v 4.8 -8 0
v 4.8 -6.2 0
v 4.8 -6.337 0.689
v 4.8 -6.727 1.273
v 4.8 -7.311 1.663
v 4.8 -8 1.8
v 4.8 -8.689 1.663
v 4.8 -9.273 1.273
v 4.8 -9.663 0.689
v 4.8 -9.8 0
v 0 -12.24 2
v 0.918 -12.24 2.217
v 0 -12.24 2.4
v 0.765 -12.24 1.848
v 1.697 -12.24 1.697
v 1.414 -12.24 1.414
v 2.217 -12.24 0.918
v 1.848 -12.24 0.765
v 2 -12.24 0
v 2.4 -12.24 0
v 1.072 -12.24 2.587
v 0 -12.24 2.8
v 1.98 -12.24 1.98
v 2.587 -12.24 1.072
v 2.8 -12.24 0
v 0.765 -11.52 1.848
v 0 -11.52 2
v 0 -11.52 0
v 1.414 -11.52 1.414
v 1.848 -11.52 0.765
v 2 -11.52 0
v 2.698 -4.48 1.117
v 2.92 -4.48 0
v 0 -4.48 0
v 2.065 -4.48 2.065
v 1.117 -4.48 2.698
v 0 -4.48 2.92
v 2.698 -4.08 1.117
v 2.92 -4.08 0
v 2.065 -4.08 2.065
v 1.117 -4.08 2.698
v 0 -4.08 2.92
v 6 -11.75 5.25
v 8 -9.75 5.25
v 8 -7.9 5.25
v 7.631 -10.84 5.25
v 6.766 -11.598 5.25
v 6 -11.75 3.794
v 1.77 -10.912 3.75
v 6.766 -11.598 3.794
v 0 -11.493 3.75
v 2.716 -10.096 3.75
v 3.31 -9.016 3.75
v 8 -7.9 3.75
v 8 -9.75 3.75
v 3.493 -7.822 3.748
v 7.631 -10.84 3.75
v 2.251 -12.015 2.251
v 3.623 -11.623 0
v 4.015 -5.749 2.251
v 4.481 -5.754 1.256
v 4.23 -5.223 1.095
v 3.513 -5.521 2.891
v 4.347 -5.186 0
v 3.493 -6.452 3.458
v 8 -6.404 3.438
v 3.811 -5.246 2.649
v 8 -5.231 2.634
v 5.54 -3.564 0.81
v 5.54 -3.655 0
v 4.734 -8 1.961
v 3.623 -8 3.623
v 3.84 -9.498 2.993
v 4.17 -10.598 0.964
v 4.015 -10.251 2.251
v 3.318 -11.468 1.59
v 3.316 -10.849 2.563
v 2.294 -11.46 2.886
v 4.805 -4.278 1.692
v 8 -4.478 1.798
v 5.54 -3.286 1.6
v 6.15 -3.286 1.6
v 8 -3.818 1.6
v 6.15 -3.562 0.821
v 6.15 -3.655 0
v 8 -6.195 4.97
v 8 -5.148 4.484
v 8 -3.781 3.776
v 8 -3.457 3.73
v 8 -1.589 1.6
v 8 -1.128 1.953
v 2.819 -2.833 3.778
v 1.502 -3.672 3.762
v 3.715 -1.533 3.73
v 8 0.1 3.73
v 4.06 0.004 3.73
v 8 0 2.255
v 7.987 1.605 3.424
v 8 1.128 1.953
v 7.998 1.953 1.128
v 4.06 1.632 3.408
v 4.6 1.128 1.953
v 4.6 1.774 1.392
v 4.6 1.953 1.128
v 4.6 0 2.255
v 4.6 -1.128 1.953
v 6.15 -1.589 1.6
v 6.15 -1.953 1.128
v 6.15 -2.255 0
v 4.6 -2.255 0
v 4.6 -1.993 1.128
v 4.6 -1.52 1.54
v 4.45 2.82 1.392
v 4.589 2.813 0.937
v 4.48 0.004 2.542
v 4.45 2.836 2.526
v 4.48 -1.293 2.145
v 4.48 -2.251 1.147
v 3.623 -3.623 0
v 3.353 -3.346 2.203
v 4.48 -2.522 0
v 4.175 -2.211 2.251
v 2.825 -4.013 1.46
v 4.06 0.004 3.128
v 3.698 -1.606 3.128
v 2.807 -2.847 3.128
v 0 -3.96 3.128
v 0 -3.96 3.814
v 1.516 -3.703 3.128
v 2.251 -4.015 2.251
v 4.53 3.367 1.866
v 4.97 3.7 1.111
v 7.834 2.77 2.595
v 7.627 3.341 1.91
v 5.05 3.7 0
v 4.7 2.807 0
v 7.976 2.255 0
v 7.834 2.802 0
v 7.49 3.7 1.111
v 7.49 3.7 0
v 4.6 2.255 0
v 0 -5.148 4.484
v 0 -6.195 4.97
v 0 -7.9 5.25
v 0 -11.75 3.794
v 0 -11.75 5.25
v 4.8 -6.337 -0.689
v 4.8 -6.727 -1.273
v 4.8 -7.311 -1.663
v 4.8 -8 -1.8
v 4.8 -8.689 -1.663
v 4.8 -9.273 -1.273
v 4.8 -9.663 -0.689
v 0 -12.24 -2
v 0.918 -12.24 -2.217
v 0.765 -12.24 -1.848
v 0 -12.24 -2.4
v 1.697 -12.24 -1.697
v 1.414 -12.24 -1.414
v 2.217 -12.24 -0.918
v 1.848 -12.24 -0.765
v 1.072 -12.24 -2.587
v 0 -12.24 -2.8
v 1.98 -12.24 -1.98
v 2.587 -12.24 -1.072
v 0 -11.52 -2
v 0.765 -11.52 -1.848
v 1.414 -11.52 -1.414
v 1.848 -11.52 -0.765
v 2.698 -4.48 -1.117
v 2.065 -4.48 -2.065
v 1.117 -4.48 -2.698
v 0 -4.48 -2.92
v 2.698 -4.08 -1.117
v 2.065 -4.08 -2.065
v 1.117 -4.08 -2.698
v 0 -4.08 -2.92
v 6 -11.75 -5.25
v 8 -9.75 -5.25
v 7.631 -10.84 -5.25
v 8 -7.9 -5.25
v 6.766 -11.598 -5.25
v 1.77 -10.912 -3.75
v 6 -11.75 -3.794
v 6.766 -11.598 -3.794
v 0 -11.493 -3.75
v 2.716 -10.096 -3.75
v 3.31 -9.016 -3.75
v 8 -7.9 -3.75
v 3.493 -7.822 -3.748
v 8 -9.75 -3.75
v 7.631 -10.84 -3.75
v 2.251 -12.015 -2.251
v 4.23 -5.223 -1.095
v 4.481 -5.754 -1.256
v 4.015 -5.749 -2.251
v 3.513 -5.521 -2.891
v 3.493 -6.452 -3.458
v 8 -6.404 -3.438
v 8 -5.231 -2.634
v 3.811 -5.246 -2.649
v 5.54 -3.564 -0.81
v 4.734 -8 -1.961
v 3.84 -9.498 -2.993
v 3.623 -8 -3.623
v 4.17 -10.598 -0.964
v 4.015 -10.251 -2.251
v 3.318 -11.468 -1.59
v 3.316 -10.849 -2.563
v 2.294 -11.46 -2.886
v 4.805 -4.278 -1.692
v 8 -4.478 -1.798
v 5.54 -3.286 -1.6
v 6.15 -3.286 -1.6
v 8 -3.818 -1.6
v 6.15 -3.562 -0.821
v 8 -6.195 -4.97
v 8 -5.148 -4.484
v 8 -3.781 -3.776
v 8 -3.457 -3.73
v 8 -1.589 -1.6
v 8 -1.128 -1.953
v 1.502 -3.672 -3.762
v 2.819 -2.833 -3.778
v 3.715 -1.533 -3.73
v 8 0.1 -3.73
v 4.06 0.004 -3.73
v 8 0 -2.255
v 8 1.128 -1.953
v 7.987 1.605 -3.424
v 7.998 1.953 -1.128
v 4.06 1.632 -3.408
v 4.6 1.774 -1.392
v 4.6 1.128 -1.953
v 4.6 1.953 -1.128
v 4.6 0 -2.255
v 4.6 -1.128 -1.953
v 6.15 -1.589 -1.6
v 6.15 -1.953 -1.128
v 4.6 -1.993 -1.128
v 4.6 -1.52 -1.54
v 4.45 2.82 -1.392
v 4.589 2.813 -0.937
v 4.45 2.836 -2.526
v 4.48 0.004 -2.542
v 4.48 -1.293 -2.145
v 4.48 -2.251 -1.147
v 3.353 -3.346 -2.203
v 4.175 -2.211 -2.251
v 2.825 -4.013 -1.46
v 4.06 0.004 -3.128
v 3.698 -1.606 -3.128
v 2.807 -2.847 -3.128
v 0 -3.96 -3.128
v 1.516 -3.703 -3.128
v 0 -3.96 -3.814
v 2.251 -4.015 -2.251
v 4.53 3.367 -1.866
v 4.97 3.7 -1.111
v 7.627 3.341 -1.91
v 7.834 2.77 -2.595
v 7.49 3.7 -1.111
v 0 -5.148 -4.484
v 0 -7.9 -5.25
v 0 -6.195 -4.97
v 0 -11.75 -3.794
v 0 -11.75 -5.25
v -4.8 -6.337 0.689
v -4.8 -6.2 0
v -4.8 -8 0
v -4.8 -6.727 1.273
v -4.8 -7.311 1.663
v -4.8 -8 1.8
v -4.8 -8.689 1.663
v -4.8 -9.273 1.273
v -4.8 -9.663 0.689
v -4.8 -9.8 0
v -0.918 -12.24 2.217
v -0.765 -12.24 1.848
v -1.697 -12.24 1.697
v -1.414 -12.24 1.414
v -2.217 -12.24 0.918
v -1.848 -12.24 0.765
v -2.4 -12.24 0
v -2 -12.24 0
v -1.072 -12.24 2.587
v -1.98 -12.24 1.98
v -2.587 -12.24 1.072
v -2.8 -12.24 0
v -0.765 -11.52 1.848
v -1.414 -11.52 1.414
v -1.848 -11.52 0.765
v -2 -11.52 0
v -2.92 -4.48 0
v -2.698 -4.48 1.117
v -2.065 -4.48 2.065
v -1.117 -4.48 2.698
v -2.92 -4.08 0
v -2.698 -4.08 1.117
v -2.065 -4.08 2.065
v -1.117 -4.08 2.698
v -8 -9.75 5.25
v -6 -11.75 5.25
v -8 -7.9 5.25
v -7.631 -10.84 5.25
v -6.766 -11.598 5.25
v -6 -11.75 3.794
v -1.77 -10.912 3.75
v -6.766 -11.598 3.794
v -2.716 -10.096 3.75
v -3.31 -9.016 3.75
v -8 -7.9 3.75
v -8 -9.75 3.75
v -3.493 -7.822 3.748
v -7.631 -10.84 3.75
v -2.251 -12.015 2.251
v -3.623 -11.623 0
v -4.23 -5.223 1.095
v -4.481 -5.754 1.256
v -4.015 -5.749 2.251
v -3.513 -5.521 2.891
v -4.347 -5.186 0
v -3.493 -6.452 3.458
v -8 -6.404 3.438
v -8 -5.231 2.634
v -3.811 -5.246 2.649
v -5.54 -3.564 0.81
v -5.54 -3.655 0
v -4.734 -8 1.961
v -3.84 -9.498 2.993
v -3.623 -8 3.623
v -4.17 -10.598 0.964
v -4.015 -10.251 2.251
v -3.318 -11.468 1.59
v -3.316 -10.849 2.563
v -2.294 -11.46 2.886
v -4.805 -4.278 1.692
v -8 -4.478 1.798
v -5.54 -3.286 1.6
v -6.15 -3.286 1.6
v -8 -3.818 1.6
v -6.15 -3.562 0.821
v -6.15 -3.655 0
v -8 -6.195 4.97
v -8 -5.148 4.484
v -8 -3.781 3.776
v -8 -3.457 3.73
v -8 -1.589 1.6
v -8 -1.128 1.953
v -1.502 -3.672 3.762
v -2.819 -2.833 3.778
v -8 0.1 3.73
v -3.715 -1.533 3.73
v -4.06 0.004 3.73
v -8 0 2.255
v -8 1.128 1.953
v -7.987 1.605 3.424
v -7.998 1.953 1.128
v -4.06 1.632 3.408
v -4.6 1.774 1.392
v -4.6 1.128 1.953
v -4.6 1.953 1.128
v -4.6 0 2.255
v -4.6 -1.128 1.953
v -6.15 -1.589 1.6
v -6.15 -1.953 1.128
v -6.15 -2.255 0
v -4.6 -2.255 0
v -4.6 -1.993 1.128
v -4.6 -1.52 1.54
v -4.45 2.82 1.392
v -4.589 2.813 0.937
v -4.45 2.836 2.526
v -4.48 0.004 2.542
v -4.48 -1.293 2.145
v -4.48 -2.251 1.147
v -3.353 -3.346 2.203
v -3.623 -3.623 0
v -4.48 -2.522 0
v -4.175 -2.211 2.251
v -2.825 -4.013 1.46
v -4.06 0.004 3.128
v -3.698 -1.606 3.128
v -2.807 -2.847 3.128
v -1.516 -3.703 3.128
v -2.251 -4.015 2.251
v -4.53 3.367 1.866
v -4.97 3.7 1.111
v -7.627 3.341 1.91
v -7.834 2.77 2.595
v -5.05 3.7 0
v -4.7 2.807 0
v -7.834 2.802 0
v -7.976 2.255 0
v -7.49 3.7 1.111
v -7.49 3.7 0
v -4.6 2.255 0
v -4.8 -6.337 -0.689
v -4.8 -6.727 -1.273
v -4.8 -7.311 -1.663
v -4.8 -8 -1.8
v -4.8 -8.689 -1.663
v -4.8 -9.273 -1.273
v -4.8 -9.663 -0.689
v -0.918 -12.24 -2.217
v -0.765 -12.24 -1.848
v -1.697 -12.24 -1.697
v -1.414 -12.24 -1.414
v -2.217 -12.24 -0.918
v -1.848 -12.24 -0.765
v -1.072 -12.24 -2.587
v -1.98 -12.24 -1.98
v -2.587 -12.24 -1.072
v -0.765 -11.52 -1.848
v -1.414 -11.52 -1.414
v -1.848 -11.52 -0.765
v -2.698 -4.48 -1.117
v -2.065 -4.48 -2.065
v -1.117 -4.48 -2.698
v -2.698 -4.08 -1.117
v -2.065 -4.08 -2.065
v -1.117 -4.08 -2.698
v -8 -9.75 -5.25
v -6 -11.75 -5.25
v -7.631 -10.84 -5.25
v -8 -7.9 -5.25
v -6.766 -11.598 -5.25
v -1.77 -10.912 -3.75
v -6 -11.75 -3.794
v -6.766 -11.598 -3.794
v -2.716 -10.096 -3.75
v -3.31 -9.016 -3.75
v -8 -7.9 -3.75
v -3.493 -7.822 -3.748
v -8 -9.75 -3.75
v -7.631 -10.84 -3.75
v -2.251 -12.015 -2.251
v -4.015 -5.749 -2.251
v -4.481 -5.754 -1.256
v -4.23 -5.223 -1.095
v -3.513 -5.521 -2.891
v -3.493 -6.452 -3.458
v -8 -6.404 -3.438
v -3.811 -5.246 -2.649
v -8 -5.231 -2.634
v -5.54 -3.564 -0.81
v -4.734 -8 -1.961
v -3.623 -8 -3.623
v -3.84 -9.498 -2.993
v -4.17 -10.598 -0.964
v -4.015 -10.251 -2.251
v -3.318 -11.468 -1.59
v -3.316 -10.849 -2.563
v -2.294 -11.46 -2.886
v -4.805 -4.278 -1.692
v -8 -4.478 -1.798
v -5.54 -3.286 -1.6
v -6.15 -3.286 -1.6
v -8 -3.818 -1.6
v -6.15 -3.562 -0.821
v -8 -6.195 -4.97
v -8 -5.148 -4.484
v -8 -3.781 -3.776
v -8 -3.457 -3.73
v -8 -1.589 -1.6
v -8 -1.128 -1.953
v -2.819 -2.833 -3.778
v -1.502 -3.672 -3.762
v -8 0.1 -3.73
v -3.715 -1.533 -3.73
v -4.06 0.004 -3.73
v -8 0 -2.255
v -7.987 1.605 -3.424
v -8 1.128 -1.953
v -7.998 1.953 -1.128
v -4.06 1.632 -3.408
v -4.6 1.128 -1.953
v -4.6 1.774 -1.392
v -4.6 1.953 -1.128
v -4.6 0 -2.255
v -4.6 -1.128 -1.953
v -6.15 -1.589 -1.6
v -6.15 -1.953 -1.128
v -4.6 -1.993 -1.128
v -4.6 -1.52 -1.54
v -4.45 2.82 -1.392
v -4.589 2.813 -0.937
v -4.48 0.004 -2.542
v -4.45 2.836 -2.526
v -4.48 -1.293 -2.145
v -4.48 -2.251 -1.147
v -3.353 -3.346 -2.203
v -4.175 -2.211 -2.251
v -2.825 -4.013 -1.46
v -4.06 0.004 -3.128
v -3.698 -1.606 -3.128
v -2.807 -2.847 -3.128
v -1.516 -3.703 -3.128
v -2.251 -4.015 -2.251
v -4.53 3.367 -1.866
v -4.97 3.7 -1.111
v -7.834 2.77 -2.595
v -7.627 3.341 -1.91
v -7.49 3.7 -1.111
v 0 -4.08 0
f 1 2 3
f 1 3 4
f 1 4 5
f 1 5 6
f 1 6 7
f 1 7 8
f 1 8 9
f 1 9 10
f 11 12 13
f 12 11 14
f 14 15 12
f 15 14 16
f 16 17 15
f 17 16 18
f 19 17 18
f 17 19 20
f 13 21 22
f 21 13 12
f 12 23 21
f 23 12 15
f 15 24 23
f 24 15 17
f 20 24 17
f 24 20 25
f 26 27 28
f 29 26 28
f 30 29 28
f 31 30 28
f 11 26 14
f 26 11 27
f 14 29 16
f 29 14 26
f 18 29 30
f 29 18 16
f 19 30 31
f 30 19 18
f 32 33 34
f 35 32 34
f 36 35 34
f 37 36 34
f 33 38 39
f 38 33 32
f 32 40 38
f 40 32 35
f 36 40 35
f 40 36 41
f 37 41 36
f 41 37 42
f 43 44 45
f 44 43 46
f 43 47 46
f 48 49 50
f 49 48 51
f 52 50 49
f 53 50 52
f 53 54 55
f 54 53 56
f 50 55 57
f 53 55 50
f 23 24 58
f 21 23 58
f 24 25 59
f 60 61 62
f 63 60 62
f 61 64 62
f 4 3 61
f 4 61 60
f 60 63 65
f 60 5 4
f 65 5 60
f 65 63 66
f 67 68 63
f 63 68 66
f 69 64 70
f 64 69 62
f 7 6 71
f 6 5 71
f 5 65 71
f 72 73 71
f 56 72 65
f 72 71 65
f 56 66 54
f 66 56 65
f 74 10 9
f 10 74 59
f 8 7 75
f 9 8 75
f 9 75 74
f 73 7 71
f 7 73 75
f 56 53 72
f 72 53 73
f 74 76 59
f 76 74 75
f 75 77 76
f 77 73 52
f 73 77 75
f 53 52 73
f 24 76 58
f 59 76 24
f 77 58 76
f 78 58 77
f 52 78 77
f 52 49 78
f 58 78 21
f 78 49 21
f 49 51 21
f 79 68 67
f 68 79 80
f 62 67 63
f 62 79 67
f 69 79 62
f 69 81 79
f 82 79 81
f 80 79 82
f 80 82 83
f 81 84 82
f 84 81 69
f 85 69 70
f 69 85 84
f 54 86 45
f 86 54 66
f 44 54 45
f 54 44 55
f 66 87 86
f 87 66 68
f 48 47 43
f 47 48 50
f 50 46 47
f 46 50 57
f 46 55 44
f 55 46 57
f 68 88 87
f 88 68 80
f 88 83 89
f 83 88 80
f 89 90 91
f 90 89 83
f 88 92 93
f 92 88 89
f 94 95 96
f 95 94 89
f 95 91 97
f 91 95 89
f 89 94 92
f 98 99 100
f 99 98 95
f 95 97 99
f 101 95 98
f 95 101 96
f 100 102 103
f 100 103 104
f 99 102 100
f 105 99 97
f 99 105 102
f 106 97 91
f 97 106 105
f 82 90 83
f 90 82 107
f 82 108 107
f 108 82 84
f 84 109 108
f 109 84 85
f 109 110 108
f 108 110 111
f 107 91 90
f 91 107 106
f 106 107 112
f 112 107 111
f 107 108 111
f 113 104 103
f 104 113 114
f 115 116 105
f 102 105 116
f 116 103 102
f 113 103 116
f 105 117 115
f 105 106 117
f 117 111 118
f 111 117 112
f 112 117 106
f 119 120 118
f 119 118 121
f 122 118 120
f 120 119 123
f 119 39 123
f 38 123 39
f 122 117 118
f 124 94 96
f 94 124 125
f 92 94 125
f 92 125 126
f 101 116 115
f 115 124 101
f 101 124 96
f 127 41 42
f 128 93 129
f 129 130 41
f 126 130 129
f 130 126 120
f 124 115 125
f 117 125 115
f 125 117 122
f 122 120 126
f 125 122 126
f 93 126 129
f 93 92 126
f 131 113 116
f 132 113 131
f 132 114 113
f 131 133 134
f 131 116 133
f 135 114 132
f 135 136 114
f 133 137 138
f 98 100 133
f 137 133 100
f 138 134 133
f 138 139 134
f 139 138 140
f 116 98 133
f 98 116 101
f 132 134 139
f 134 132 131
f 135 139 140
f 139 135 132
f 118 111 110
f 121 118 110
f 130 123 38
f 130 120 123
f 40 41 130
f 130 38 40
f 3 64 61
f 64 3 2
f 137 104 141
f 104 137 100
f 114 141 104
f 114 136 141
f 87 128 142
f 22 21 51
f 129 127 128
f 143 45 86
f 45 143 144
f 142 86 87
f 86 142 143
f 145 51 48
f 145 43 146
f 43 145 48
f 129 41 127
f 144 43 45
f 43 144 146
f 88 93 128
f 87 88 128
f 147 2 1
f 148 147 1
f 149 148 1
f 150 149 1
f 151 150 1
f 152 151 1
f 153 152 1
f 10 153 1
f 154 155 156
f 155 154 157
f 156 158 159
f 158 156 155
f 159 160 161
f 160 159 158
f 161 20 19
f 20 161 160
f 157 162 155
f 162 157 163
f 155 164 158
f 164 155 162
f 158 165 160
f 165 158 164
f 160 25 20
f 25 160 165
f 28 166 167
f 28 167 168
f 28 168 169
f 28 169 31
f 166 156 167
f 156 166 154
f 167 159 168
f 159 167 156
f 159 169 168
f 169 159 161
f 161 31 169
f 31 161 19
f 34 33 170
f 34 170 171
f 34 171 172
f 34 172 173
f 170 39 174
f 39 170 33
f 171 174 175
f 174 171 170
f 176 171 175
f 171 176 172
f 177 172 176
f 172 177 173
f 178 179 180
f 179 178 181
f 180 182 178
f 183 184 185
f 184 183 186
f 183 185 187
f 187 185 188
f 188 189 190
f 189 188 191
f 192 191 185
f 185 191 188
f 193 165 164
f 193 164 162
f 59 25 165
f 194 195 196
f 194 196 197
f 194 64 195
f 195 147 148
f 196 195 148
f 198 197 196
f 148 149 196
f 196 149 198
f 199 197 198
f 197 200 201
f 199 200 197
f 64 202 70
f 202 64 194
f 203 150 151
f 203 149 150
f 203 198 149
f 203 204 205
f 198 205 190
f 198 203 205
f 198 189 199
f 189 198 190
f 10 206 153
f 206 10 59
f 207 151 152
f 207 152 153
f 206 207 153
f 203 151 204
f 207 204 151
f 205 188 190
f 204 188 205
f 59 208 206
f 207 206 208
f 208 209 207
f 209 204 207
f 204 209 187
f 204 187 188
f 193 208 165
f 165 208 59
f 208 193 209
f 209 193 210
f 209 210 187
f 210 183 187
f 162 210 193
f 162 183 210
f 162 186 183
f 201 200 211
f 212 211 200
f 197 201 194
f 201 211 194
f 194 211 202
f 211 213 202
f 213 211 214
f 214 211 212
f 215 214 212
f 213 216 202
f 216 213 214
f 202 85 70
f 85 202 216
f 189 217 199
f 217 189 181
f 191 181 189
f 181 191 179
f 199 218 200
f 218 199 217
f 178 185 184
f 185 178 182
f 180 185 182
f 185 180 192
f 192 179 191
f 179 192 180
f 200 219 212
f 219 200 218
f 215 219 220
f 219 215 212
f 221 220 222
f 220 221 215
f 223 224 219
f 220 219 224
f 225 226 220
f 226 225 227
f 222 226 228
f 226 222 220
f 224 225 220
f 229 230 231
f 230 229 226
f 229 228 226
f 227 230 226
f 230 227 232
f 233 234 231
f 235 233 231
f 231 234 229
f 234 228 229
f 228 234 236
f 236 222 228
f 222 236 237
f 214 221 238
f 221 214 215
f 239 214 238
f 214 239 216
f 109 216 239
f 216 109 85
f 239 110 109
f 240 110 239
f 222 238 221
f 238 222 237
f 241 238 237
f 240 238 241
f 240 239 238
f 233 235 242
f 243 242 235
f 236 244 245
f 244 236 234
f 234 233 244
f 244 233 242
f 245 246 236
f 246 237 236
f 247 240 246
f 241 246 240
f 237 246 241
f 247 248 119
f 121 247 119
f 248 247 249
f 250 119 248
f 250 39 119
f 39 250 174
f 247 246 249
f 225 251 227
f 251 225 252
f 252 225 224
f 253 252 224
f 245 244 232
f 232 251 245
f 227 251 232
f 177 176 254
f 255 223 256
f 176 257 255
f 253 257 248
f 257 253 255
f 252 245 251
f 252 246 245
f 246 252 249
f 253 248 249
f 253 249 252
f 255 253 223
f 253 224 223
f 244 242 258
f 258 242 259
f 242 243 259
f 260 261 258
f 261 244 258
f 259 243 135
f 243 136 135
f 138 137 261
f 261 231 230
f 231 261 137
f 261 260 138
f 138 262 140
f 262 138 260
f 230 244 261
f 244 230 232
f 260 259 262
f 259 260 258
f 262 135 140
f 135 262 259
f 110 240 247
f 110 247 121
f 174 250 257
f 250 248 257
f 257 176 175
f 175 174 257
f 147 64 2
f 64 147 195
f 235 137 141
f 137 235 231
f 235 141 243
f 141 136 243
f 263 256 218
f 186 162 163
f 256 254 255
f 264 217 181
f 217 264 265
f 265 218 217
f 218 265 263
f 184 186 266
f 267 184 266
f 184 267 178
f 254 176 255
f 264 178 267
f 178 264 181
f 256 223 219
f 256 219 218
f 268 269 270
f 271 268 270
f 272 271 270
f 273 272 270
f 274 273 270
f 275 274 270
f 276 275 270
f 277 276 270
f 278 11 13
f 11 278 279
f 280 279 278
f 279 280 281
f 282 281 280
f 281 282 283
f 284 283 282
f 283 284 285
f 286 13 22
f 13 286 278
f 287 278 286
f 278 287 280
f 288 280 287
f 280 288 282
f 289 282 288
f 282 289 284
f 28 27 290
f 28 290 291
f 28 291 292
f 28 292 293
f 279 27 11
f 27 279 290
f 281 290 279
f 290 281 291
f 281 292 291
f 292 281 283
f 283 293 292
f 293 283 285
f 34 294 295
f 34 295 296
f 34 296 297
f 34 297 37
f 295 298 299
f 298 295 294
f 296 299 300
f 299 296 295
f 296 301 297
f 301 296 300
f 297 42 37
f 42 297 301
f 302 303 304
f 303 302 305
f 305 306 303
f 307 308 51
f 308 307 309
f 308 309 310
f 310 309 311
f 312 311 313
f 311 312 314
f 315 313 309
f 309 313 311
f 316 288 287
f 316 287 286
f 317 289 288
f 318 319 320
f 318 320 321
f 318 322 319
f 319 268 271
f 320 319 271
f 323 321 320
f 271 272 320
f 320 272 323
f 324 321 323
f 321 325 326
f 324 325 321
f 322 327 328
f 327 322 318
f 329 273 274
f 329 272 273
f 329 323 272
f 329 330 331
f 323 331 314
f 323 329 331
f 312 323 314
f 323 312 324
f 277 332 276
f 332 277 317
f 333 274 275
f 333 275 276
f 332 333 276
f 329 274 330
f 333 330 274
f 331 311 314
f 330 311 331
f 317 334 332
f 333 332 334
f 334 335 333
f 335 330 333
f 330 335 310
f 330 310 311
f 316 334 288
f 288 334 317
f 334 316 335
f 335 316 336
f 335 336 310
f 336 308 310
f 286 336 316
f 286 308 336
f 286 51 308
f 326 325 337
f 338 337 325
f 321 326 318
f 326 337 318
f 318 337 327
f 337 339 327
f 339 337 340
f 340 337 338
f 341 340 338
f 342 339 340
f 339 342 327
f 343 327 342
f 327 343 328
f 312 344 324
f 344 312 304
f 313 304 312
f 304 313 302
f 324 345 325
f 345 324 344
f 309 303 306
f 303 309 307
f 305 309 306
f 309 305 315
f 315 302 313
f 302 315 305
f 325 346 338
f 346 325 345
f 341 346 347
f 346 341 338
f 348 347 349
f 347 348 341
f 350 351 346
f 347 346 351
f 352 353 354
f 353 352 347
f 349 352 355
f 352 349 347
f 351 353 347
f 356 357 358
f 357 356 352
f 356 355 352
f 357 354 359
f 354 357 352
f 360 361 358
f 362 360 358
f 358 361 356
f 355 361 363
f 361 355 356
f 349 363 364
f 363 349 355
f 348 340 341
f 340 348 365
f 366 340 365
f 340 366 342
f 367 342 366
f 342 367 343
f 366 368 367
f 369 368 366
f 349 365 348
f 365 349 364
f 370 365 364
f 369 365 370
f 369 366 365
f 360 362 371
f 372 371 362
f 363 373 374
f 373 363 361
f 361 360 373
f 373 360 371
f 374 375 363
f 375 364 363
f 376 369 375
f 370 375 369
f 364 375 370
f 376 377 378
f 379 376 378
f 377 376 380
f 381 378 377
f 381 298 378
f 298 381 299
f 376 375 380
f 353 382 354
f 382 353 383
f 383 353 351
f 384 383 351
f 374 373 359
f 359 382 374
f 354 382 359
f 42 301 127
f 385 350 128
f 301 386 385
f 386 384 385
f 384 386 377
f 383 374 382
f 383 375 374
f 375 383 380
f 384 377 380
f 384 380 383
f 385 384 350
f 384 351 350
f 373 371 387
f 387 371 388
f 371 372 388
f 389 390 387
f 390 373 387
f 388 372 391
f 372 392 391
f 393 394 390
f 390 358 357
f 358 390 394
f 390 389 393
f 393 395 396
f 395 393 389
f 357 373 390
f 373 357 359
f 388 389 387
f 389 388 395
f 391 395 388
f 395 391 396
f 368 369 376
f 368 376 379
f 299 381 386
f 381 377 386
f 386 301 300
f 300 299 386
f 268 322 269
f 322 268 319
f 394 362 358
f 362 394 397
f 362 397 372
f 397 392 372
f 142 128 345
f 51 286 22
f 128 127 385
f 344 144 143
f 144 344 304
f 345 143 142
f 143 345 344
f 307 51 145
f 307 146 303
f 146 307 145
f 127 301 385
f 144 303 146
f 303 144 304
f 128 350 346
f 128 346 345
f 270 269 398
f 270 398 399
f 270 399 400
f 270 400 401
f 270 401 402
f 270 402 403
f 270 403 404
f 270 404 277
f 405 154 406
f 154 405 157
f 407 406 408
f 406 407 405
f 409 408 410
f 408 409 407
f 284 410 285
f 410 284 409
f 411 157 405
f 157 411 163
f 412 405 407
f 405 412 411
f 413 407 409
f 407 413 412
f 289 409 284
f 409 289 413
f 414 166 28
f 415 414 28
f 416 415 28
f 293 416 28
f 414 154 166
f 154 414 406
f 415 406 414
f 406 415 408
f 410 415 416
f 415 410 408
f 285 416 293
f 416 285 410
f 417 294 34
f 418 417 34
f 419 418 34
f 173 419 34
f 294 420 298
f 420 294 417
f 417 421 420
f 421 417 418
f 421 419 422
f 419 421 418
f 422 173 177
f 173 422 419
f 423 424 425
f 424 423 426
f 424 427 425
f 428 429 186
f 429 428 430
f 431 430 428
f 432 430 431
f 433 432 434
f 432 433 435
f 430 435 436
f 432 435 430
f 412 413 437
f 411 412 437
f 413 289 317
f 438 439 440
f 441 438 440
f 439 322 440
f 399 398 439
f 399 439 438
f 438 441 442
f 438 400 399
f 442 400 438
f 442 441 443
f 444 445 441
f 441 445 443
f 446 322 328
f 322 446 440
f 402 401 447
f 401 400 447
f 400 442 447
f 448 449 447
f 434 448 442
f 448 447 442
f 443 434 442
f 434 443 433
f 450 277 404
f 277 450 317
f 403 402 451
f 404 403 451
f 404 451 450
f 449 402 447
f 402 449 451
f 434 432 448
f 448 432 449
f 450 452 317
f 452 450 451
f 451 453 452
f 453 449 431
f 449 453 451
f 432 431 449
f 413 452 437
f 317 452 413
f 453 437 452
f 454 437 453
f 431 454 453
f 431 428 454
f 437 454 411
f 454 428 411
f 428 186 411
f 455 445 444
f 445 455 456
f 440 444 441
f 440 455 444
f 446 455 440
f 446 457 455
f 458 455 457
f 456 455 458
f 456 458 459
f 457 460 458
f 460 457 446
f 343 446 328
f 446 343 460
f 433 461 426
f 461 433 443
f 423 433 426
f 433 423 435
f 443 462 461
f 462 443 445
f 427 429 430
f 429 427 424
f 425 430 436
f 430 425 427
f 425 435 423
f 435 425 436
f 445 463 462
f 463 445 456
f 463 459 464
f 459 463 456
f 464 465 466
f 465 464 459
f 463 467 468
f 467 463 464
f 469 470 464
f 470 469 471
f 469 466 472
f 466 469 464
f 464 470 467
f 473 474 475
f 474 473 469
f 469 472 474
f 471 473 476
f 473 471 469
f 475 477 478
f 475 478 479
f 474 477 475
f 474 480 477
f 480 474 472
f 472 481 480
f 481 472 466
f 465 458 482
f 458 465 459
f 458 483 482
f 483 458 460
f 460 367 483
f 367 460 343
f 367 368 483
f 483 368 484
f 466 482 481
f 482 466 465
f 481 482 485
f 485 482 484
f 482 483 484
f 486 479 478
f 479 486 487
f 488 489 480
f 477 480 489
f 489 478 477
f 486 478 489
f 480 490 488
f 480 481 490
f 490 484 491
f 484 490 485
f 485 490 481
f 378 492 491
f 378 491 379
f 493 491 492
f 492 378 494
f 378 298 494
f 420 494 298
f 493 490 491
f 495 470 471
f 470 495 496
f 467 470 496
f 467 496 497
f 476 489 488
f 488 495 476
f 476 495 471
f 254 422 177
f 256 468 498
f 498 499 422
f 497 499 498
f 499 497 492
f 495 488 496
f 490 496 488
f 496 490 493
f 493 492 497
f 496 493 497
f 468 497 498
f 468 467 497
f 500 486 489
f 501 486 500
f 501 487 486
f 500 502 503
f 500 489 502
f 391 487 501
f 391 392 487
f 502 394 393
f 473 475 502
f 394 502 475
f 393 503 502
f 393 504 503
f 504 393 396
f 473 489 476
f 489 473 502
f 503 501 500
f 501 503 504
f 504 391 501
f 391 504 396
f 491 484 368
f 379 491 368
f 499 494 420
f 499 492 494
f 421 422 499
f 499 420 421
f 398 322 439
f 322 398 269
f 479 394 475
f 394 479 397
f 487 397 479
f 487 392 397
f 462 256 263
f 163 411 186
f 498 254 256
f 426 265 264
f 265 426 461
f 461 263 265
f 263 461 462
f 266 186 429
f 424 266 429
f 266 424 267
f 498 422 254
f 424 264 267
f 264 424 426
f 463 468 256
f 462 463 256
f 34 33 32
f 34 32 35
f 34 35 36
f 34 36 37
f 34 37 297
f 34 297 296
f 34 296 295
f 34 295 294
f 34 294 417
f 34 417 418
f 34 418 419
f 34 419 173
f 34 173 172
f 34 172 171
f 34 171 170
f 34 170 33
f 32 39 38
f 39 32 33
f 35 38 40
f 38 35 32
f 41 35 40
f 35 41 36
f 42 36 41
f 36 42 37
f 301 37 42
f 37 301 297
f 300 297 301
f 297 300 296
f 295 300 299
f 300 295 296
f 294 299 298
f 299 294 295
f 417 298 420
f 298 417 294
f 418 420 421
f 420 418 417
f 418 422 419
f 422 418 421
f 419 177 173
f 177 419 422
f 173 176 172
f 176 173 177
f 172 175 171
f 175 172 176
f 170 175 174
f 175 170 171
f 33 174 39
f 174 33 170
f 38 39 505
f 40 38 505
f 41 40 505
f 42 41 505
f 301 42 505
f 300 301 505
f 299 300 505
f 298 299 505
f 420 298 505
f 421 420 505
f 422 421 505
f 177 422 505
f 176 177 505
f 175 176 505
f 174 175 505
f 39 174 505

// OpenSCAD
use <../lib.scad>
use <../p/4-4cylc.scad>
use <../p/4-4disc.scad>
use <98613.scad>
$fa=1; $fs=0.2;
function ldraw_lib__74261(realsolid=false) = [
// 0 Constraction Limb  2 Extender with Rubber Black Inlay
// 0 Name: 74261.dat
// 0 Author: Magnus Forsberg [MagFors]
// 0 !LDRAW_ORG Part UPDATE 2018-02
// 0 !LICENSE Licensed under CC BY 2.0 and CC BY 4.0 : see CAreadme.txt
// 
// 0 BFC CERTIFY CCW
  [0,"BFC","CERTIFY"],
  [0,"BFC","CCW"],
// 
// 0 !HISTORY 2013-08-14 {LEGO Digital Designer} Original part shape
// 0 !HISTORY 2016-04-07 [MagFors] File preparation for LDraw Parts Tracker
// 0 !HISTORY 2018-12-08 [PTadmin] Official Update 2018-02
// 
// 
// 1 16 0 0 0 1 0 0 0 1 0 0 0 1 98613.dat
  [1,16,0,0,0,1,0,0,0,1,0,0,0,1, ldraw_lib__98613(realsolid)],
// 0 // rubber inlay
// 1 256 0 0 -11.2 7.3 0 0 0 0 -7.3 0 1 0 4-4cylc.dat
  [1,256,0,0,-11.2,7.3,0,0,0,0,-7.3,0,1,0, ldraw_lib__4_4cylc(realsolid)],
// 1 256 0 0 -10.2 7.3 0 0 0 0 -7.3 0 -1 0 4-4disc.dat
  [1,256,0,0,-10.2,7.3,0,0,0,0,-7.3,0,-1,0, ldraw_lib__4_4disc(realsolid)],
];
module ldraw_lib__74261(step=0, col=false, unit=2/5, alt=false, line=0.2, solid=!$preview)
    makepoly(ldraw_lib__74261(solid), step=step, col=col, unit=unit, alt=alt, line=line, solid=solid);
ldraw_lib__74261(line=0.2);
